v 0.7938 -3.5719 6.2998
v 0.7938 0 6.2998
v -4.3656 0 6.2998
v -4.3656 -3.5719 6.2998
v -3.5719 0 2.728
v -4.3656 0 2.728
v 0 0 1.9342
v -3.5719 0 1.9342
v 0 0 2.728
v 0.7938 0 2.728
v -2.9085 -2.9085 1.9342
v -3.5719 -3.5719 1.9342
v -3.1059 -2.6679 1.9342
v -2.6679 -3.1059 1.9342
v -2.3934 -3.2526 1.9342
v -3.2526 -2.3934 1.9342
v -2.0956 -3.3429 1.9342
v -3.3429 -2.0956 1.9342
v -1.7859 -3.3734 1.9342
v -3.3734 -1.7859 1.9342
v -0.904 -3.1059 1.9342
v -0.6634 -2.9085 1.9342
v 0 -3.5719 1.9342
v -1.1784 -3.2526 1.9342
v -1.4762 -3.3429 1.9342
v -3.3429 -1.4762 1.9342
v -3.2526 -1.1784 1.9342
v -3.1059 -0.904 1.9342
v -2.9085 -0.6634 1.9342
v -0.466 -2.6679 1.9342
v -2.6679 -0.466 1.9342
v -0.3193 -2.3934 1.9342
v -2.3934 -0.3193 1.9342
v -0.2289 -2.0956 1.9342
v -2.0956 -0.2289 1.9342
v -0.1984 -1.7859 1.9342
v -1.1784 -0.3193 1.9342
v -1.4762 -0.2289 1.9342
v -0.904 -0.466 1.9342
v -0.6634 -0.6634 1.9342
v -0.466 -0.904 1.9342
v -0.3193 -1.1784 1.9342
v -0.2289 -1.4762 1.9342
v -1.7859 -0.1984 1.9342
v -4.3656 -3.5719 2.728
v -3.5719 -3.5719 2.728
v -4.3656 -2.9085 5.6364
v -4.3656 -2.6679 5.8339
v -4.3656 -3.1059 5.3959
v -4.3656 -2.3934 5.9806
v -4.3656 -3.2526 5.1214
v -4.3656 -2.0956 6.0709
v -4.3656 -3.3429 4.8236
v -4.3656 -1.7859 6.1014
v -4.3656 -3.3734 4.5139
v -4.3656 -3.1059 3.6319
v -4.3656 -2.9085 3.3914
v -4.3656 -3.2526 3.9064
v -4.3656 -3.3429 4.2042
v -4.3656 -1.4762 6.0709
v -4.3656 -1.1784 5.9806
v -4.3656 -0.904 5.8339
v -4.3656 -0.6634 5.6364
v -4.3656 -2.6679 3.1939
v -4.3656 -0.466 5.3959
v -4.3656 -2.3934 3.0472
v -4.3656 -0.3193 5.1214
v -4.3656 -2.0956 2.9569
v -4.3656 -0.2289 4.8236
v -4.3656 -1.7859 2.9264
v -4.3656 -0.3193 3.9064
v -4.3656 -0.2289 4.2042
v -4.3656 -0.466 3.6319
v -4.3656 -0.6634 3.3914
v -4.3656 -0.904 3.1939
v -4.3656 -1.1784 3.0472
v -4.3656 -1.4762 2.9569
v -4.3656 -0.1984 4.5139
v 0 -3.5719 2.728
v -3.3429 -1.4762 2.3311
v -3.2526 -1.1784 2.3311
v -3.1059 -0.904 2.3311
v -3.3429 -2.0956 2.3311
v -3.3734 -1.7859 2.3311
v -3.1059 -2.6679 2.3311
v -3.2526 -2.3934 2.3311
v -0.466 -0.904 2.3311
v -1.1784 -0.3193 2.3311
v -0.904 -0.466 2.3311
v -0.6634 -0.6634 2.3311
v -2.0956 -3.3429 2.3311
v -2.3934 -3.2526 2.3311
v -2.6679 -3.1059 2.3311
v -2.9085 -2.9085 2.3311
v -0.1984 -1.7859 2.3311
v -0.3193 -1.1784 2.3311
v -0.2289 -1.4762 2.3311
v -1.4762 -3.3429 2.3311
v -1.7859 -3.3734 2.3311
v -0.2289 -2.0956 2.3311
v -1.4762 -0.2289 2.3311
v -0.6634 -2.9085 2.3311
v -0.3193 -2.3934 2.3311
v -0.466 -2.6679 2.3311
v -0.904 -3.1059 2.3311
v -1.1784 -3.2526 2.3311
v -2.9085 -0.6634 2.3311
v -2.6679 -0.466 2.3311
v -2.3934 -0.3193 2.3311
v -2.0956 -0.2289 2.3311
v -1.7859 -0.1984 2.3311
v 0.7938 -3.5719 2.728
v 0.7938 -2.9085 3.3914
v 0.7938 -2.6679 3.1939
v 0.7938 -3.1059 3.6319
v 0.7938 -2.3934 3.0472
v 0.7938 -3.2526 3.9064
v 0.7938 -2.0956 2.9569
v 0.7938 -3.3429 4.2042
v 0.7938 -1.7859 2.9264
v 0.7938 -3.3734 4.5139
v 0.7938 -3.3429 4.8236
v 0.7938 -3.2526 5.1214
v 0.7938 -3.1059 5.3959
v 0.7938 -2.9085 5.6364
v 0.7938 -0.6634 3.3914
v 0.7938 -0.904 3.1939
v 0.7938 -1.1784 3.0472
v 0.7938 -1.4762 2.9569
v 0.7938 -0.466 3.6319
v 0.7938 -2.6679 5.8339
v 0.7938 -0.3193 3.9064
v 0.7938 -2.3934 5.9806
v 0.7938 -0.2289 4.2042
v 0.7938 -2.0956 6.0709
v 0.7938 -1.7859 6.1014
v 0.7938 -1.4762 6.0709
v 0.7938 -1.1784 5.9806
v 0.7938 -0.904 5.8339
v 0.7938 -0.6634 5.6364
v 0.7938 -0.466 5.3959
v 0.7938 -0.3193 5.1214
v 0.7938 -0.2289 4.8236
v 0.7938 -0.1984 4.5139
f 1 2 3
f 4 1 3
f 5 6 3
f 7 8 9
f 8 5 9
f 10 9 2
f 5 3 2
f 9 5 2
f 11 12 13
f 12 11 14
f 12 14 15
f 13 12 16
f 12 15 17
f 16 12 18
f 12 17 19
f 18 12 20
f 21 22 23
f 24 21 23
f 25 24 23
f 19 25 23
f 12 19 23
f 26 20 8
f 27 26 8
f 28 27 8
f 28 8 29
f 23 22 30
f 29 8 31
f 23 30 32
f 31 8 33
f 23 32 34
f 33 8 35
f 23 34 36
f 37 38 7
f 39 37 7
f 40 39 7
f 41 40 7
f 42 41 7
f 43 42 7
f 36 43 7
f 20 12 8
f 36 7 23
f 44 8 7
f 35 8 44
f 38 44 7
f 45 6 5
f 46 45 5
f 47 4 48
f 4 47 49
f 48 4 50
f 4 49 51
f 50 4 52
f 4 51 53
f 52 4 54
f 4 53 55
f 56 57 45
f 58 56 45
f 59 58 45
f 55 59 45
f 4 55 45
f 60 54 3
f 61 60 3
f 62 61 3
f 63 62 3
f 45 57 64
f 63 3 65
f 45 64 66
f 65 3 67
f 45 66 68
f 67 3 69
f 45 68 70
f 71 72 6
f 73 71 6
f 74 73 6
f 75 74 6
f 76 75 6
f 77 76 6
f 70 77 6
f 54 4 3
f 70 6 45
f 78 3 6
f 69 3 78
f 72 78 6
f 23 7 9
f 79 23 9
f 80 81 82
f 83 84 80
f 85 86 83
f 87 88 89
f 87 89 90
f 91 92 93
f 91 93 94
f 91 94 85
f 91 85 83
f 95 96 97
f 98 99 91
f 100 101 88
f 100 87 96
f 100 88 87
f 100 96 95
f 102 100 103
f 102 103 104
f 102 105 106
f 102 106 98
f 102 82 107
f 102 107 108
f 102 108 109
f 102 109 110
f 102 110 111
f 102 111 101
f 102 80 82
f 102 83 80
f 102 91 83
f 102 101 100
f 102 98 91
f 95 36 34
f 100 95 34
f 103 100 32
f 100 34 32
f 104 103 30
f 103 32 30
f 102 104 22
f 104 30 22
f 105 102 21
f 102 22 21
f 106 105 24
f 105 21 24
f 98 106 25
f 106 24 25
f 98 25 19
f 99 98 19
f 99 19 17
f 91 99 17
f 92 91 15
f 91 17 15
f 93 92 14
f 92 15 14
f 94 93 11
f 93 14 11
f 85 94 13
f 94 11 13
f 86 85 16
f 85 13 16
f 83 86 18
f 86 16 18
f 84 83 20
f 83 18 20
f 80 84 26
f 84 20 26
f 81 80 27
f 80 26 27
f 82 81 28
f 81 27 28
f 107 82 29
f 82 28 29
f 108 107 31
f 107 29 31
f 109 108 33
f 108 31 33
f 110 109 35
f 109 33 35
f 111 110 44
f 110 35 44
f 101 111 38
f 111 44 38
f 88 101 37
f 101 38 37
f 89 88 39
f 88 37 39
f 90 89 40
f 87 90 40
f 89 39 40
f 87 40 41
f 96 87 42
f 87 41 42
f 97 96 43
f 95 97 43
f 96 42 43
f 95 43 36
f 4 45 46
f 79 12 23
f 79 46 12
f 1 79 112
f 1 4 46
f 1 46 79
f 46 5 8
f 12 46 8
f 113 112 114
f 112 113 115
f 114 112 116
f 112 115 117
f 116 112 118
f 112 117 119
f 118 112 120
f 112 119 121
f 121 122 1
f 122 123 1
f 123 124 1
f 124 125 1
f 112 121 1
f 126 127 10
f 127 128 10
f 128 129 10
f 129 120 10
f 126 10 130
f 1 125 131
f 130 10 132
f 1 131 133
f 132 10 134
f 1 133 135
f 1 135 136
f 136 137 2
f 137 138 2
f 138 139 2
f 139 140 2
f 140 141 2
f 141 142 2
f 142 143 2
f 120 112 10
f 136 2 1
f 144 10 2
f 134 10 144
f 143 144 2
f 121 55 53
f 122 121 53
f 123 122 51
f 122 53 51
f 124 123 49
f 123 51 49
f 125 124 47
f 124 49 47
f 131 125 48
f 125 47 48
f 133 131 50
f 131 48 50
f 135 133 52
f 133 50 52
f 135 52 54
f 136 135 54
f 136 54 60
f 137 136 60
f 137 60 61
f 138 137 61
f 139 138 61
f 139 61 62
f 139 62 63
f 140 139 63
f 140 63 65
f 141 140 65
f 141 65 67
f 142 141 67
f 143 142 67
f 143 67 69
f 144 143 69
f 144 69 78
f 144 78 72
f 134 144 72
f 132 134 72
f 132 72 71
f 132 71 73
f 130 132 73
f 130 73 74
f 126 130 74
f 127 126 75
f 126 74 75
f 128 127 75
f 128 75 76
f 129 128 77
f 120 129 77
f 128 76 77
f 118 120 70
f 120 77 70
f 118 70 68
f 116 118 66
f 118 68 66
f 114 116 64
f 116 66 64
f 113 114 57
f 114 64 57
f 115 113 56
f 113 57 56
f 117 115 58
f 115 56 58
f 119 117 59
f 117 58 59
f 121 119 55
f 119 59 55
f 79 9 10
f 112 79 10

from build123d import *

# Parameters (mm, degrees)
F1_DEPTH = 3.571875
F2_R     = 1.5875
F3_DEPTH = 0.396875
F4_R     = 1.5875
F5_DEPTH = 25.4


with BuildPart() as f1:
    # F0 (on Front) → F1 (new body)
    with BuildSketch(Plane.XZ):
        Polygon((-3.571875, 1.934221), (0, 1.934221), (0, 2.727971), (0.79375, 2.727971), (0.79375, 6.299846), (-4.365625, 6.299846), (-4.365625, 2.727971), (-3.571875, 2.727971), align=None)
    extrude(amount=F1_DEPTH)

    # F2 (on face) → F3 (cut)
    with BuildSketch(Plane(origin=(0, 0, 1.934221), x_dir=(1, 0, 0), z_dir=(0, 0, -1))):
        with Locations((-1.785937, 1.785938)):
            Circle(F2_R)
    extrude(amount=-F3_DEPTH, mode=Mode.SUBTRACT)

    # F4 (on face) → F5 (cut)
    with BuildSketch(Plane(origin=(-4.365625, 0, 0), x_dir=(0, -1, 0), z_dir=(-1, 0, 0))):
        with Locations((1.785938, 4.513908)):
            Circle(F4_R)
    extrude(amount=-F5_DEPTH, mode=Mode.SUBTRACT)


solid = f1.part
